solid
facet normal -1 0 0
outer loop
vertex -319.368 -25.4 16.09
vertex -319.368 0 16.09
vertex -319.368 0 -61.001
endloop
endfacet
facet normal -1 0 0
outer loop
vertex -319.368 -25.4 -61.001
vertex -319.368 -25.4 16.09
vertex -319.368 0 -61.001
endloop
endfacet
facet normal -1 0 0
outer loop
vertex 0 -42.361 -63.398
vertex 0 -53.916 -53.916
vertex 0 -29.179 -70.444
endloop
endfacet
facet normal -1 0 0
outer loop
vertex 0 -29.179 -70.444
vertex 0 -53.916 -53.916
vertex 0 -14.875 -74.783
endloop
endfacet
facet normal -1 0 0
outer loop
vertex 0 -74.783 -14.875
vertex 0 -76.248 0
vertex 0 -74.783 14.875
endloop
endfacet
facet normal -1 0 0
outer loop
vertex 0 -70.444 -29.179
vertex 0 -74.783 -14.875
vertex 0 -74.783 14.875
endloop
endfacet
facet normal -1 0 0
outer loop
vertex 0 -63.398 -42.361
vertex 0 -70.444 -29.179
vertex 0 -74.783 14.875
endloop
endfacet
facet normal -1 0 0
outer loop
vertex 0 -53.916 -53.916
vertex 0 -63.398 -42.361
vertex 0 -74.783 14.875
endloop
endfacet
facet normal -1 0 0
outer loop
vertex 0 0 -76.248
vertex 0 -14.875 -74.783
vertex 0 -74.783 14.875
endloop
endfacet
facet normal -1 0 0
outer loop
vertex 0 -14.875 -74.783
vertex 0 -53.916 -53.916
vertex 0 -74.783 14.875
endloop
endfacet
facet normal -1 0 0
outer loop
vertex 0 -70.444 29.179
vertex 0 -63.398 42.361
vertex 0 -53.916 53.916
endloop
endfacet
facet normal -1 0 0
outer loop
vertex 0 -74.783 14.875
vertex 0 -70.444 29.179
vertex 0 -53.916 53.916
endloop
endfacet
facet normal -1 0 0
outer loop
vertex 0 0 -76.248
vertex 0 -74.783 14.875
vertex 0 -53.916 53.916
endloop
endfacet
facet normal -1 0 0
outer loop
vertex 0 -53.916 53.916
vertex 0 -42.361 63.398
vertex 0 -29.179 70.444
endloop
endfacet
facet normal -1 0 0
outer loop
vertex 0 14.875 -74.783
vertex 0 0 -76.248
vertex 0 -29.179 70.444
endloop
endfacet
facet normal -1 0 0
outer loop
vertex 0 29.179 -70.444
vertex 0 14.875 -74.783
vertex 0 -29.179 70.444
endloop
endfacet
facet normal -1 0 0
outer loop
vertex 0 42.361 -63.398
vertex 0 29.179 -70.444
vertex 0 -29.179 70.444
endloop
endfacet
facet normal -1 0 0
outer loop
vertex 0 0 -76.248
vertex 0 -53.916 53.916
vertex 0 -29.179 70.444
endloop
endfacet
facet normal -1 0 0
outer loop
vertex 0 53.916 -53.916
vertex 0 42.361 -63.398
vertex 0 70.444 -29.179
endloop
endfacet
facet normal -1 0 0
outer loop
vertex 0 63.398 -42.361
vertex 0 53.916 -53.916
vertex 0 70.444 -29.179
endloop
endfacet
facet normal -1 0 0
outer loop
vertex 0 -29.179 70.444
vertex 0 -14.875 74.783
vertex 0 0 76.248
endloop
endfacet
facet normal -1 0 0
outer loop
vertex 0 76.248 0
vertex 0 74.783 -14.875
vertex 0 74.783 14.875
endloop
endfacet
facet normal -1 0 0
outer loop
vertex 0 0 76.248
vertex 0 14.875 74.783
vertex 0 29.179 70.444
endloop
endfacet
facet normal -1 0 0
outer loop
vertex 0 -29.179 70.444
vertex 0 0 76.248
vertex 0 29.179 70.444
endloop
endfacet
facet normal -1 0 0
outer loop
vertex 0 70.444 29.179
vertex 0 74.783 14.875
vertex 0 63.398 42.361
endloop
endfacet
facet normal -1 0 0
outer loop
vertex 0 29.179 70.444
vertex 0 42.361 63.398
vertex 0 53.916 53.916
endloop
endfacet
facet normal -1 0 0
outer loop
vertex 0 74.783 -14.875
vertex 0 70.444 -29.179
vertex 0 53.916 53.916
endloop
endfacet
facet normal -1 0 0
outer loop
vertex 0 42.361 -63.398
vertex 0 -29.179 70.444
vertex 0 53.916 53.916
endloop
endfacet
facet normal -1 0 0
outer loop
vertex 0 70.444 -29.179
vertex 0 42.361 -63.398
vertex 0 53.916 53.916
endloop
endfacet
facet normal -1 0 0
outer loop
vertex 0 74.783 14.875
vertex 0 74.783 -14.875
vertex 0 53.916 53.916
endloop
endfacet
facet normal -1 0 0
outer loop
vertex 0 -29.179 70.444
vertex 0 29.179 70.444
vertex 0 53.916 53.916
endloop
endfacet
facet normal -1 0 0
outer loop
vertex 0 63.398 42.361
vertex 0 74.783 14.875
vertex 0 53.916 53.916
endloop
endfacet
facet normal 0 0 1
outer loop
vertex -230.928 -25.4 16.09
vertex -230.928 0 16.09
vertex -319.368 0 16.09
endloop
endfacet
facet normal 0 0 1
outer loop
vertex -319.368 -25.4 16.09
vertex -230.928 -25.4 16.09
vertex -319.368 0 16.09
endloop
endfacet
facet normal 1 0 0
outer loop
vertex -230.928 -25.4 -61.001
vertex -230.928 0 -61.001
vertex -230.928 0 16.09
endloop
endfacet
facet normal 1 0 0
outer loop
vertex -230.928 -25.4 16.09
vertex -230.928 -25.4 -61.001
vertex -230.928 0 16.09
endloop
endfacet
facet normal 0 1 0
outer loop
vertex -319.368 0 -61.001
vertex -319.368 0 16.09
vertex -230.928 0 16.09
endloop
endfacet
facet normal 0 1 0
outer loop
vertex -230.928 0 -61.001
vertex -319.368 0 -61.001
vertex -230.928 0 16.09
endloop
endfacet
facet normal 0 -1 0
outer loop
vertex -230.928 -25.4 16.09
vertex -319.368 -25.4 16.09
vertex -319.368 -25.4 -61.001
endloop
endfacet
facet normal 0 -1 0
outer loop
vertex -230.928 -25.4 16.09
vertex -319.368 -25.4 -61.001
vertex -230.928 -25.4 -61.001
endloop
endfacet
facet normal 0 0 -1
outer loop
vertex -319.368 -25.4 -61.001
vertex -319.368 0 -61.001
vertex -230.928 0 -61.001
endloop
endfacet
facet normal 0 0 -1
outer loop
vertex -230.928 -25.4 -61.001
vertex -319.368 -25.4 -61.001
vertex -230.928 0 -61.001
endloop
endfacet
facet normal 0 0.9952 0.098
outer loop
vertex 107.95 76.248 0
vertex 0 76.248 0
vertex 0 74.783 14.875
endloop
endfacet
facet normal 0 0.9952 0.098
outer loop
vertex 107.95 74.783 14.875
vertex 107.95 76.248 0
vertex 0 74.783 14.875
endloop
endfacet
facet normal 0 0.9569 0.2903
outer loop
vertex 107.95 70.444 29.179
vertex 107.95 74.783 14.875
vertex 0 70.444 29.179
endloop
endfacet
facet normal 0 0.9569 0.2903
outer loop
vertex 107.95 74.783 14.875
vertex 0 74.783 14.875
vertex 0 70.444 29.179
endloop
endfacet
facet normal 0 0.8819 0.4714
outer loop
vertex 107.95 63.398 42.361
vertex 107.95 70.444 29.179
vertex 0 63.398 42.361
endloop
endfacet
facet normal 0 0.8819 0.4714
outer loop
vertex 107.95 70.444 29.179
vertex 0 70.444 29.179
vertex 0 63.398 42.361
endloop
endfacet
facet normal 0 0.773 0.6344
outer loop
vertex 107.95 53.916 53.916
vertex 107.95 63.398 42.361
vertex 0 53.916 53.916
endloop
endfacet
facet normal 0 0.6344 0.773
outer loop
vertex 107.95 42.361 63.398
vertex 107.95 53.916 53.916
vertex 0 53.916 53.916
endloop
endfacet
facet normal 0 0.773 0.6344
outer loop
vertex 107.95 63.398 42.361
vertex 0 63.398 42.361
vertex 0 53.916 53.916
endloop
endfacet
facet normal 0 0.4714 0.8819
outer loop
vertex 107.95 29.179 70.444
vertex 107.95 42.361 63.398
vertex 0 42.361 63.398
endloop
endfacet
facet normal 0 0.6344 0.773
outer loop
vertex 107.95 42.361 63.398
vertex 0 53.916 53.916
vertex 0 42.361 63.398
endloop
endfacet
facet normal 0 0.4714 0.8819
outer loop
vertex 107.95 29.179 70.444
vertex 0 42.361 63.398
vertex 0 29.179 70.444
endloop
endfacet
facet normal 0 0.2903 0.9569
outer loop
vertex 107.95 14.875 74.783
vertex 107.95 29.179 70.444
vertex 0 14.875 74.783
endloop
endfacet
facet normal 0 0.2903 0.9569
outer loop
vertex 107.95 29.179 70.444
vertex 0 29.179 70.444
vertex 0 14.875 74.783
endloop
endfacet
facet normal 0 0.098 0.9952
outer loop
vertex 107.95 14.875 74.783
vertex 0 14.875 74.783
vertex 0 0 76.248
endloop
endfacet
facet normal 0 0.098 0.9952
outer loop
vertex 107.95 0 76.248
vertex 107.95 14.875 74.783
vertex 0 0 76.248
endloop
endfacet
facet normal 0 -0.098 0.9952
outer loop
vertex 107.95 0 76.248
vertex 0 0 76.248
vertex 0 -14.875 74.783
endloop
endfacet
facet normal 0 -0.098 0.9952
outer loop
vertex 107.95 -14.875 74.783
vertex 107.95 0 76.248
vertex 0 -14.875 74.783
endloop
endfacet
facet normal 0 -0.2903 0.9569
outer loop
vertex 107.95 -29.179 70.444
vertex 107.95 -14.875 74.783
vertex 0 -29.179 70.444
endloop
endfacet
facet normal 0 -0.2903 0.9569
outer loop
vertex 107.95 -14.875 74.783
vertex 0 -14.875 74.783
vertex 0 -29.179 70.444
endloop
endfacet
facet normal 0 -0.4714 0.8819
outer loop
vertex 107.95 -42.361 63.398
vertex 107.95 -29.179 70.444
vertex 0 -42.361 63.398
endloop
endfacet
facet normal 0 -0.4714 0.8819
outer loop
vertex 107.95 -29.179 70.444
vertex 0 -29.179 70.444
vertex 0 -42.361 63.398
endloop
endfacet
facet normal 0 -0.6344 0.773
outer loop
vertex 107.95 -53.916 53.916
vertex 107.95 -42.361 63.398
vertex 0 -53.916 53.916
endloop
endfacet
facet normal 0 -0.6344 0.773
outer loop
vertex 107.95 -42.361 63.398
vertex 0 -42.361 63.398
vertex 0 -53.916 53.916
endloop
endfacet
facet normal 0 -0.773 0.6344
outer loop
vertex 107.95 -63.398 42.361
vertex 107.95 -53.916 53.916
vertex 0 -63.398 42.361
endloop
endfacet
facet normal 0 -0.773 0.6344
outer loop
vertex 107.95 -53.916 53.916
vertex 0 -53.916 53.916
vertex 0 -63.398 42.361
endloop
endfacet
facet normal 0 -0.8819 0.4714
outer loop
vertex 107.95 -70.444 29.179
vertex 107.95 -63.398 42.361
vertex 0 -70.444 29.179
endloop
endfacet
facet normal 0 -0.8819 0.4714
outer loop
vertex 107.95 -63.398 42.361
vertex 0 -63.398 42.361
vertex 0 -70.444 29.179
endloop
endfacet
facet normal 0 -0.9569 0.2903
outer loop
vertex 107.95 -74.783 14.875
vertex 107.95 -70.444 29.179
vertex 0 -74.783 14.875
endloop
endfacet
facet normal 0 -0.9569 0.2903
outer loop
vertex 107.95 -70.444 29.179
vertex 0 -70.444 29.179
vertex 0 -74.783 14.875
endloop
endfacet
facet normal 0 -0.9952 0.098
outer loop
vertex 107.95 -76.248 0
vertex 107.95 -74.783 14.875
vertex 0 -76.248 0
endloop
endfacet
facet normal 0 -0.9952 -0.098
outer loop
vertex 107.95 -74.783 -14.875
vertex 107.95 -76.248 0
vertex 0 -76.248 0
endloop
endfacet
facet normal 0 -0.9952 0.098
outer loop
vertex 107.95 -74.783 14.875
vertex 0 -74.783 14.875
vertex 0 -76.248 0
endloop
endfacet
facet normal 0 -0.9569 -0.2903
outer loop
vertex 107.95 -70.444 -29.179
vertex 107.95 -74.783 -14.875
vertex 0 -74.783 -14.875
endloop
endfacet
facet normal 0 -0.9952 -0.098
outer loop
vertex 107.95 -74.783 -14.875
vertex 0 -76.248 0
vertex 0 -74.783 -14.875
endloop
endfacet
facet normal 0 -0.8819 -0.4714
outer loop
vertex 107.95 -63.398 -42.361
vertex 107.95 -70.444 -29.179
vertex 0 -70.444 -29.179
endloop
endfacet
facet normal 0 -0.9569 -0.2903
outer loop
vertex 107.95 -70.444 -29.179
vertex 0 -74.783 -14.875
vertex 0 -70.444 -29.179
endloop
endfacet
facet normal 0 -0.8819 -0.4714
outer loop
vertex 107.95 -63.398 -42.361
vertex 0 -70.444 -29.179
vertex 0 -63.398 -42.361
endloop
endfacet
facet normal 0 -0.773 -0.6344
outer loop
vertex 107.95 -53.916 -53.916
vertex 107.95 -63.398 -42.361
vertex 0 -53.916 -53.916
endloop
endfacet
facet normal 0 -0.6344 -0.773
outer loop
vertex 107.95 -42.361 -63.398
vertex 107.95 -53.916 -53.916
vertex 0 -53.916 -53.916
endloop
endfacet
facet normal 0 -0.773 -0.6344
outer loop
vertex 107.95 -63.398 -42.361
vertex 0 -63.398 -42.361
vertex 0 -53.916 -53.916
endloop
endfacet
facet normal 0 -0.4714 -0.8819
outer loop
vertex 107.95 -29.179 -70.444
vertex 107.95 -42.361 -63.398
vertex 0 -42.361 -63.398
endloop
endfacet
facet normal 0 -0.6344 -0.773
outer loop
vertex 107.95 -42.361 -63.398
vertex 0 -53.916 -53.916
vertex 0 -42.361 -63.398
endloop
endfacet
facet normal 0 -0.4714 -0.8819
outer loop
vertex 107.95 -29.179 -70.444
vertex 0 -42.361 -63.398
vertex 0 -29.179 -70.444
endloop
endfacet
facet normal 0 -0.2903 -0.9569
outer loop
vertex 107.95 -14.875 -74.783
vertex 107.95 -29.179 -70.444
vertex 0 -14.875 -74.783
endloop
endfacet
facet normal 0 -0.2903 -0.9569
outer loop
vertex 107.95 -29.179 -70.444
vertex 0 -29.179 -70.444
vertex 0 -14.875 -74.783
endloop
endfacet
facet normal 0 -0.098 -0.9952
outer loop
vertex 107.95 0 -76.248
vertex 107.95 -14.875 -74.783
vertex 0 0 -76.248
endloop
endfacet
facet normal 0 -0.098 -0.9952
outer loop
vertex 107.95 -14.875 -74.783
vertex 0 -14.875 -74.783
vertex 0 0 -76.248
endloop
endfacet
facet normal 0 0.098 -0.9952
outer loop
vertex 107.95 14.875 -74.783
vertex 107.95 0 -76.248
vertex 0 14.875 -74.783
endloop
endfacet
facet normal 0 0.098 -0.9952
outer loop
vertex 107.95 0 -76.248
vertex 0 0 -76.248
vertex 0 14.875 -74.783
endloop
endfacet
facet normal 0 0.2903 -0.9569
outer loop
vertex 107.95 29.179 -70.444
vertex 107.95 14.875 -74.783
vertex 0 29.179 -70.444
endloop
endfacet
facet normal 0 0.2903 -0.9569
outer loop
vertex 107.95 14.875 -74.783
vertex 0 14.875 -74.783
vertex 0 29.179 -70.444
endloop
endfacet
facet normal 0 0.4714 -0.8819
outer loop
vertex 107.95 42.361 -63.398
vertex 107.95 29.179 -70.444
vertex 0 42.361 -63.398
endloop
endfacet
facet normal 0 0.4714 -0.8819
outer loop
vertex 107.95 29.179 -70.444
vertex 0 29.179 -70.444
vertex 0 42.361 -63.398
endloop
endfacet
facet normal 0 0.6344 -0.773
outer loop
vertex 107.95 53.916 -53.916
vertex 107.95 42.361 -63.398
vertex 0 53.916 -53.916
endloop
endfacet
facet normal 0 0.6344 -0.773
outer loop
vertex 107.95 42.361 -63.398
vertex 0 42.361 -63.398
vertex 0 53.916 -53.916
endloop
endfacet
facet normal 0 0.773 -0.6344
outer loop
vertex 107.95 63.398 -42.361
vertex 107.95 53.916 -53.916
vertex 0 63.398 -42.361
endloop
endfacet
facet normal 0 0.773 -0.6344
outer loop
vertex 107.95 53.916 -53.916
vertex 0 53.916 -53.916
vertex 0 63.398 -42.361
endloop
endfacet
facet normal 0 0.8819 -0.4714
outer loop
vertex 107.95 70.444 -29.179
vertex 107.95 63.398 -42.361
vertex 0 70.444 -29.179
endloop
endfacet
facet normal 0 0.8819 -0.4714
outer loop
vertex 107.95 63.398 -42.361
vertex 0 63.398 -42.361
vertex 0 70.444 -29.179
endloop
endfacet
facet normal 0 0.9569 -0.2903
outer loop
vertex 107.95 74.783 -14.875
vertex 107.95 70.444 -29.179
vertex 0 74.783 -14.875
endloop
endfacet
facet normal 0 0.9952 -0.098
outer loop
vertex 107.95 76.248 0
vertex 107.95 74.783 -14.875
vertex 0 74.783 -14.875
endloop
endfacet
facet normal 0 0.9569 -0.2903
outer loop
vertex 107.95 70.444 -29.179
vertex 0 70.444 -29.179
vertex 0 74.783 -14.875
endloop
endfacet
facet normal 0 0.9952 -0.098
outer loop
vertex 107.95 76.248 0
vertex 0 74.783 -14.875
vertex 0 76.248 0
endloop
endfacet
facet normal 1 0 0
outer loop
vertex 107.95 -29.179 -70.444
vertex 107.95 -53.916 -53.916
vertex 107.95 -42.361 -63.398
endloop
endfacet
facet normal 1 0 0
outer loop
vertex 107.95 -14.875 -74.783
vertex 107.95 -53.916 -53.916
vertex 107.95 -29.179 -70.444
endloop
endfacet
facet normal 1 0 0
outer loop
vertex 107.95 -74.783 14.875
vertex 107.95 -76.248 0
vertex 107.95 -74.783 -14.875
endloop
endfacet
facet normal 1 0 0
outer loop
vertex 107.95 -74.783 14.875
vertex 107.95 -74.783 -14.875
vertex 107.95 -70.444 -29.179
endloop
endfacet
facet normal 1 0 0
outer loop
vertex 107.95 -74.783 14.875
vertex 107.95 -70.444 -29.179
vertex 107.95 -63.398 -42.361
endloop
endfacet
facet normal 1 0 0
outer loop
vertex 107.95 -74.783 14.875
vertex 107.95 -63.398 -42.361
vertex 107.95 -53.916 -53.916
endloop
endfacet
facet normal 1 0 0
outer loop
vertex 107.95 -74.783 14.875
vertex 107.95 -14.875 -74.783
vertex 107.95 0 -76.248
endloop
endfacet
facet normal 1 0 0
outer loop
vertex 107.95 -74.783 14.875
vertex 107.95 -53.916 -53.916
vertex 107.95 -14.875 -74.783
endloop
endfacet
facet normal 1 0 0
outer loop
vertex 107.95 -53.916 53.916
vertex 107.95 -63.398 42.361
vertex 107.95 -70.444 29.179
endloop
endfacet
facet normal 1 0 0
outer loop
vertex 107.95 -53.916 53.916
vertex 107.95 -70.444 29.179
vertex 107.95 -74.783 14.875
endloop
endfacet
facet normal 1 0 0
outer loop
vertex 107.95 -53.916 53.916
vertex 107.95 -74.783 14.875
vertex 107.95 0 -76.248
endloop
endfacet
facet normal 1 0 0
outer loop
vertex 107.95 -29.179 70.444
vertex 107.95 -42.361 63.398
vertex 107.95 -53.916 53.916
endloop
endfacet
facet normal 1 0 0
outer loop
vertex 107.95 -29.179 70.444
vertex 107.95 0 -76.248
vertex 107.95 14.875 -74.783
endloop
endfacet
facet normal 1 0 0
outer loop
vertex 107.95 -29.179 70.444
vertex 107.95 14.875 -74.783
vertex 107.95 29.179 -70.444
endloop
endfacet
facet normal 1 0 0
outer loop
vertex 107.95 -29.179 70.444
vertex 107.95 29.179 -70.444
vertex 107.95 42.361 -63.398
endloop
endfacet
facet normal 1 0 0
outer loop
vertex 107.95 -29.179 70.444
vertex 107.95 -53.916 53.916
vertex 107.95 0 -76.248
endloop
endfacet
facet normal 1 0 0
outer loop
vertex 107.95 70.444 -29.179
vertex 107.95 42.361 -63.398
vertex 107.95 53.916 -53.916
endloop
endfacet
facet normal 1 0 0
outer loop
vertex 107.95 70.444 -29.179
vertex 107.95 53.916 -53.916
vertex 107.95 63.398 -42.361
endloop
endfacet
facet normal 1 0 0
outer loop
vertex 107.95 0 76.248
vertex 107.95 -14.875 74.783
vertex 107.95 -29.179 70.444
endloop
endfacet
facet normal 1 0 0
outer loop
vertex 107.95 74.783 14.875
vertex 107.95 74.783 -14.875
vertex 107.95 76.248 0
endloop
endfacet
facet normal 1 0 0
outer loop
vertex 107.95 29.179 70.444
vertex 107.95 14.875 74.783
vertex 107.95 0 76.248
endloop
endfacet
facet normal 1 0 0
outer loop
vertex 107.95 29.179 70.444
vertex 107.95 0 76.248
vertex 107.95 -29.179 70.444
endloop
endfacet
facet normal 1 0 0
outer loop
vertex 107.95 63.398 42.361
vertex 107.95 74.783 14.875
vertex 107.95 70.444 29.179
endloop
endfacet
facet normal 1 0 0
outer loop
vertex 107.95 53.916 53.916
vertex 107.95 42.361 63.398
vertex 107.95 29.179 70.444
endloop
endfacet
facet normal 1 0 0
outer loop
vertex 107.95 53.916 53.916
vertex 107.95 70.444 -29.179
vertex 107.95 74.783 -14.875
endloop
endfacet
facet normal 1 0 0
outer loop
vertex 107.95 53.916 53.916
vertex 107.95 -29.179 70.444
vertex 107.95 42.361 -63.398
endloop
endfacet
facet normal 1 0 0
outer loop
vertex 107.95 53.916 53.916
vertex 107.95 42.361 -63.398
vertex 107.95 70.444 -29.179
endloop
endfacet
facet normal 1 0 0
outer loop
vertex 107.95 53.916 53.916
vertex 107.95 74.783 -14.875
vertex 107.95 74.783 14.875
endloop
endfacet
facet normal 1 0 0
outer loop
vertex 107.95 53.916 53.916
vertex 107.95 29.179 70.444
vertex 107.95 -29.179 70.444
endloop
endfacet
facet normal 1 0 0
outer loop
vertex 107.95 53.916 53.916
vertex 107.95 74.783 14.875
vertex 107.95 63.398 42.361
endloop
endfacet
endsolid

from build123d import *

# Parameters (mm, degrees)
F0_R     = 76.248059
F1_DEPTH = 107.95
F3_DEPTH = 25.4


with BuildPart() as f1:
    # F0 (on Right) → F1 (new body)
    with BuildSketch(Plane.YZ):
        Circle(F0_R)
    extrude(amount=F1_DEPTH)


with BuildPart() as f3:
    # F2 (on Front) → F3 (new body)
    with BuildSketch(Plane.XZ):
        Polygon((-230.927557, 16.090354), (-319.367528, 16.090354), (-319.367528, -61.001405), (-230.927557, -61.001405), (-230.927557, -8.195519), align=None)
    extrude(amount=F3_DEPTH)


solid = Compound([f1.part, f3.part])
